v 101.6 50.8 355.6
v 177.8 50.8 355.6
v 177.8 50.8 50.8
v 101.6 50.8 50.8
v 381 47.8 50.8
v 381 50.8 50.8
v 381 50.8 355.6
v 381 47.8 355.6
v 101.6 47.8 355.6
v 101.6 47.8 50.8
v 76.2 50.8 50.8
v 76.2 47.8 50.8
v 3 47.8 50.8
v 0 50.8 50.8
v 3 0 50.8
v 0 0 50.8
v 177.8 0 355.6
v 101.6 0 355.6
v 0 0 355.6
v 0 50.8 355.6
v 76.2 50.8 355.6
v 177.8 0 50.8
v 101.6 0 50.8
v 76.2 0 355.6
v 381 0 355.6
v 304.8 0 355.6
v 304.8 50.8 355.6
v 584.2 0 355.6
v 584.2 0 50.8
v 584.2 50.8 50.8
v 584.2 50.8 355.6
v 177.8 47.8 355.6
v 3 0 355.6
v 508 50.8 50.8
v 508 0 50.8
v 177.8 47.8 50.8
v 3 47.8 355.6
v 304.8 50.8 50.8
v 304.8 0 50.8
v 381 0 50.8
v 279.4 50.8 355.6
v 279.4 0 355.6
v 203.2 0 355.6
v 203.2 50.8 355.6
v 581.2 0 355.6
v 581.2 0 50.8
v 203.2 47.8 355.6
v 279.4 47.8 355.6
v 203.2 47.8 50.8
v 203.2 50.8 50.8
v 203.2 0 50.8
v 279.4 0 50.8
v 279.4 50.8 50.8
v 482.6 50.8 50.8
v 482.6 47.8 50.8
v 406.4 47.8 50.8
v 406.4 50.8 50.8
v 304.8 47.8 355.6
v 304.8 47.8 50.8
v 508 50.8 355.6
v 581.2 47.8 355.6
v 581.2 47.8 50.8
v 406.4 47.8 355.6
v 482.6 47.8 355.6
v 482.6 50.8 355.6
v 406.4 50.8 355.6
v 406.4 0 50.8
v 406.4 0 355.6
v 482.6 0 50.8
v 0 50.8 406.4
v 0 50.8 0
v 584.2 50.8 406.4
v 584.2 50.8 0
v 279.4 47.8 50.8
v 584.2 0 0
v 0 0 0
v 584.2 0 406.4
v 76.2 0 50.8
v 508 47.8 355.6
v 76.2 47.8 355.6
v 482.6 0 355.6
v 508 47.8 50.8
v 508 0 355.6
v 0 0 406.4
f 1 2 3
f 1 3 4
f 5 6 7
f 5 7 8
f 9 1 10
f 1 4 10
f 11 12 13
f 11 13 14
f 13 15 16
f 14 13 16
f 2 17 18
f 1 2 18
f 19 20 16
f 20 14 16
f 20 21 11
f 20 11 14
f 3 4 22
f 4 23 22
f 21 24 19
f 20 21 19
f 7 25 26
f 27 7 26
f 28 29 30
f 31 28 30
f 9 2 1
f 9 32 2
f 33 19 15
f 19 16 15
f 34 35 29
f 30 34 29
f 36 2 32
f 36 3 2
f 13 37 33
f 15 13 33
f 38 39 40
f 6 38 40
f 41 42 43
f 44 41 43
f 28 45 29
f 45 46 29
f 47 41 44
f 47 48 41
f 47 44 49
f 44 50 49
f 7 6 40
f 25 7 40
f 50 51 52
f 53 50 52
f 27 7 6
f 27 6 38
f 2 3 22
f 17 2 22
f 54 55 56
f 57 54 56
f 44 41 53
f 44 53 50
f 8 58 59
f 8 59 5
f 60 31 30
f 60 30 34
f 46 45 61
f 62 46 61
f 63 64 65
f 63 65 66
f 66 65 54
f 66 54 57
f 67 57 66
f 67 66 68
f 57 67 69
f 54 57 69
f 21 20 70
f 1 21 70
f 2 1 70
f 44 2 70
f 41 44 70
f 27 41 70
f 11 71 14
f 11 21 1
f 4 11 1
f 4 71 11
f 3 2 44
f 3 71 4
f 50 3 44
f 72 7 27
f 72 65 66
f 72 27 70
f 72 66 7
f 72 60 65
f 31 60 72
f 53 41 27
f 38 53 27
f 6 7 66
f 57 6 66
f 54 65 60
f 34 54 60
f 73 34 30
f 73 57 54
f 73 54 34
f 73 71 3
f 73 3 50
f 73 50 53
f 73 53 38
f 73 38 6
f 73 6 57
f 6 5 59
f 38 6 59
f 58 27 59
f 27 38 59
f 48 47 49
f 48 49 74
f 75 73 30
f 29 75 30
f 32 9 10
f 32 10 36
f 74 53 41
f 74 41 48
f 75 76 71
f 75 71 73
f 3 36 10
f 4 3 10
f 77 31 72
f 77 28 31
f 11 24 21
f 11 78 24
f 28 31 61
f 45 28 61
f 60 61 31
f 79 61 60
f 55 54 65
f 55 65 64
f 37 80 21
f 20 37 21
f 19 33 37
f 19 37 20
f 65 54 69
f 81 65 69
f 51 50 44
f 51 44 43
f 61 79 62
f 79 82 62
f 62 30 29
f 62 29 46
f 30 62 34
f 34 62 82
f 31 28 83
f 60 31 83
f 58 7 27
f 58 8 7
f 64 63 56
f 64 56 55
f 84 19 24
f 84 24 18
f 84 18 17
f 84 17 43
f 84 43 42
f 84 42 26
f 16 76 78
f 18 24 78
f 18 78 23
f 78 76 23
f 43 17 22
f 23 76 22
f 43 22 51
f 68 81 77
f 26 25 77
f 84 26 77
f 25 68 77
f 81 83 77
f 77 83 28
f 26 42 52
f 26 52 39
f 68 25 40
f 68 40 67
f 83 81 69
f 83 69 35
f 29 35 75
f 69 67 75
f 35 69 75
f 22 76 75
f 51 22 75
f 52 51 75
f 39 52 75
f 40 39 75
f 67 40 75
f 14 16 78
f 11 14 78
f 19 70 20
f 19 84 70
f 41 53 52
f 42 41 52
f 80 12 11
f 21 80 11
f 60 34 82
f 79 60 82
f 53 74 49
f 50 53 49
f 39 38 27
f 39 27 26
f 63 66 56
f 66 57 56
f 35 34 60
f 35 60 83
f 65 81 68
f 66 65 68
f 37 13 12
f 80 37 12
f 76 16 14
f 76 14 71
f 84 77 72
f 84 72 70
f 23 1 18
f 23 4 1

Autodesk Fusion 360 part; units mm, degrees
sketch "Sketch2" plane through (0, 0, 0) normal (0, 1, 0) x (1, 0, 0)
sketch "Sketch3" plane through (0, 0, 0) normal (0, 1, 0) x (1, 0, 0)
  line L0 (0, 0) -> (584.2, 0)
  line L1 (584.2, 0) -> (584.2, -50.8)
  line L2 (584.2, -50.8) -> (0, -50.8)
  line L3 (0, -50.8) -> (0, 0)
  dimension "d1" = 584.2
  dimension "d2" = 50.8
extrude "Extrude1" add sketch "Sketch3" along normal blind 50.8 makes body 1
sketch "Sketch4" plane through (0, 0, 50.8) normal (0, 0, 1) x (-1, 0, 0)
  line L0 (0, 0) -> (-584.2, 0)
  line L1 (-584.2, 0) -> (-584.2, -50.8)
  line L2 (-584.2, -50.8) -> (0, -50.8)
  line L3 (0, -50.8) -> (0, 0)
  line L4 (0, 0) -> (-76.2, 0)
  line L5 (-76.2, 0) -> (-76.2, -50.8)
  line L6 (-76.2, -50.8) -> (0, -50.8)
  line L7 (0, -50.8) -> (0, 0)
  line L8 (-76.2, -50.8) -> (-101.6, -50.8)
  line L9 (-101.6, -50.8) -> (-101.6, 0)
  line L10 (-101.6, 0) -> (-76.2, 0)
  line L11 (-76.2, 0) -> (-76.2, -50.8)
  line L12 (-101.6, -50.8) -> (-177.8, -50.8)
  line L13 (-177.8, -50.8) -> (-177.8, 0)
  line L14 (-177.8, 0) -> (-101.6, 0)
  line L15 (-101.6, 0) -> (-101.6, -50.8)
  line L16 (-177.8, -50.8) -> (-203.2, -50.8)
  line L17 (-203.2, -50.8) -> (-203.2, 0)
  line L18 (-203.2, 0) -> (-177.8, 0)
  line L19 (-177.8, 0) -> (-177.8, -50.8)
  line L20 (-203.2, -50.8) -> (-279.4, -50.8)
  line L21 (-279.4, -50.8) -> (-279.4, 0)
  line L22 (-279.4, 0) -> (-203.2, 0)
  line L23 (-203.2, 0) -> (-203.2, -50.8)
  line L24 (-279.4, -50.8) -> (-304.8, -50.8)
  line L25 (-304.8, -50.8) -> (-304.8, 0)
  line L26 (-304.8, 0) -> (-279.4, 0)
  line L27 (-279.4, 0) -> (-279.4, -50.8)
  line L28 (-304.8, -50.8) -> (-381, -50.8)
  line L29 (-381, -50.8) -> (-381, 0)
  line L30 (-381, 0) -> (-304.8, 0)
  line L31 (-304.8, 0) -> (-304.8, -50.8)
  line L32 (-381, -50.8) -> (-406.4, -50.8)
  line L33 (-406.4, -50.8) -> (-406.4, 0)
  line L34 (-406.4, 0) -> (-381, 0)
  line L35 (-381, 0) -> (-381, -50.8)
  line L36 (-406.4, -50.8) -> (-482.6, -50.8)
  line L37 (-482.6, -50.8) -> (-482.6, 0)
  line L38 (-482.6, 0) -> (-406.4, 0)
  line L39 (-406.4, 0) -> (-406.4, -50.8)
  line L40 (-482.6, -50.8) -> (-508, -50.8)
  line L41 (-508, -50.8) -> (-508, 0)
  line L42 (-508, 0) -> (-482.6, 0)
  line L43 (-482.6, 0) -> (-482.6, -50.8)
  line L44 (-508, -50.8) -> (-584.2, -50.8)
  line L45 (-584.2, -50.8) -> (-584.2, 0)
  line L46 (-584.2, 0) -> (-508, 0)
  line L47 (-508, 0) -> (-508, -50.8)
  line L48 (0, -50.8) -> (-3, -50.8)
  line L49 (-3, -50.8) -> (-3, 0)
  line L50 (-3, 0) -> (0, 0)
  line L51 (0, 0) -> (0, -50.8)
  line L52 (0, 0) -> (-76.2, 0)
  line L53 (-76.2, 0) -> (-76.2, -3)
  line L54 (0, -3) -> (0, 0)
  line L55 (-101.6, 0) -> (-177.8, 0)
  line L56 (-177.8, 0) -> (-177.8, -3)
  line L57 (-101.6, -3) -> (-101.6, 0)
  line L58 (-203.2, 0) -> (-279.4, 0)
  line L59 (-279.4, 0) -> (-279.4, -3)
  line L60 (-203.2, -3) -> (-203.2, 0)
  line L61 (-304.8, 0) -> (-381, 0)
  line L62 (-381, 0) -> (-381, -3)
  line L63 (-304.8, -3) -> (-304.8, 0)
  line L64 (-406.4, 0) -> (-482.6, 0)
  line L65 (-482.6, 0) -> (-482.6, -3)
  line L66 (-406.4, -3) -> (-406.4, 0)
  line L67 (-508, 0) -> (-584.2, 0)
  line L68 (-584.2, 0) -> (-584.2, -3)
  line L69 (-508, -3) -> (-508, 0)
  line L70 (-584.2, 0) -> (-581.2, 0)
  line L71 (-581.2, 0) -> (-581.2, -50.8)
  line L72 (-581.2, -50.8) -> (-584.2, -50.8)
  line L73 (-584.2, -50.8) -> (-584.2, 0)
  line L74 (-584.2, -50.8) -> (-508, -50.8)
  line L75 (-508, -50.8) -> (-508, -47.8)
  line L76 (-508, -47.8) -> (-584.2, -47.8)
  line L77 (-584.2, -47.8) -> (-584.2, -50.8)
  line L78 (-482.6, -50.8) -> (-406.4, -50.8)
  line L79 (-406.4, -50.8) -> (-406.4, -47.8)
  line L80 (-406.4, -47.8) -> (-482.6, -47.8)
  line L81 (-482.6, -47.8) -> (-482.6, -50.8)
  line L82 (-381, -50.8) -> (-304.8, -50.8)
  line L83 (-304.8, -50.8) -> (-304.8, -47.8)
  line L84 (-304.8, -47.8) -> (-381, -47.8)
  line L85 (-381, -47.8) -> (-381, -50.8)
  line L86 (-279.4, -50.8) -> (-203.2, -50.8)
  line L87 (-203.2, -50.8) -> (-203.2, -47.8)
  line L88 (-203.2, -47.8) -> (-279.4, -47.8)
  line L89 (-279.4, -47.8) -> (-279.4, -50.8)
  line L90 (-177.8, -50.8) -> (-101.6, -50.8)
  line L91 (-101.6, -50.8) -> (-101.6, -47.8)
  line L92 (-101.6, -47.8) -> (-177.8, -47.8)
  line L93 (-177.8, -47.8) -> (-177.8, -50.8)
  line L94 (-76.2, -50.8) -> (0, -50.8)
  line L95 (0, -50.8) -> (0, -47.8)
  line L96 (0, -47.8) -> (-76.2, -47.8)
  line L97 (-76.2, -47.8) -> (-76.2, -50.8)
  dimension "d5" = 76.2
  dimension "d6" = 25.4
  dimension "d7" = 76.2
  dimension "d8" = 25.4
  dimension "d9" = 76.2
  dimension "d10" = 25.4
  dimension "d11" = 76.2
  dimension "d12" = 25.4
  dimension "d13" = 76.2
  dimension "d14" = 25.4
  dimension "d15" = 76.2
  dimension "d24" = 3
  dimension "d25" = 3
  dimension "d26" = 3
  dimension "d27" = 3
  dimension "d28" = 3
  dimension "d29" = 3
  dimension "d30" = 3
  dimension "d31" = 3
  dimension "d32" = 3
  dimension "d33" = 3
  dimension "d34" = 3
  dimension "d35" = 3
  dimension "d36" = 3
  dimension "d37" = 3
sketch "Sketch5" plane through (0, 0, 0) normal (0, 1, 0) x (1, 0, 0)
extrude "Extrude2" add sketch "Sketch4" along normal blind 355.6 bodies 1
sketch "Sketch6" plane through (0, 0, 0) normal (0, -1, 0) x (1, 0, 0)
  line L0 (0, 406.4) -> (0, 0)
  line L1 (0, 0) -> (584.2, 0)
  line L2 (584.2, 0) -> (584.2, 406.4)
  line L3 (584.2, 406.4) -> (0, 406.4)
  line L4 (0, 0) -> (0, 50.8) construction
  line L5 (0, 50.8) -> (584.2, 50.8)
  line L6 (584.2, 50.8) -> (584.2, 355.6)
  line L7 (584.2, 355.6) -> (0, 355.6)
  line L8 (0, 355.6) -> (0, 50.8)
  dimension "d18" = 50.8
  dimension "d19" = 304.8
extrude "Extrude3" cut sketch "Sketch6" against normal blind 325 contours L0 L2 L5 L6 L7 L8 bodies 1 makes body 2 at (194.7333, 33.8667, 406.4)
extrude "Extrude4" add sketch "Sketch4" along normal blind 304.8 contours L0 L2 L5 L8 L9 L10 L11 L15 L53 L57 L91 L97 | L0 L2 L13 L16 L17 L18 L19 L23 L56 L60 L87 L93 | L0 L2 L21 L24 L25 L26 L27 L31 L59 L63 L83 L89 | L0 L2 L29 L32 L33 L34 L35 L39 L62 L66 L79 L85 | L0 L2 L37 L40 L41 L42 L43 L47 L65 L69 L75 L81 bodies 1 2
extrude "Extrude5" add sketch "Sketch4" along normal blind 304.8 separate body contours L0 L3 L4 L7 L49 L50 L51 L52 L54 L96 | L2 L3 L6 L7 L48 L49 L51 L94 L95 L96 | L2 L5 L6 L11 L49 L94 L96 L97 | L2 L9 L12 L13 L15 L19 L90 L91 L92 L93 | L2 L17 L20 L21 L23 L27 L86 L87 L88 L89 | L2 L25 L28 L29 L31 L35 L82 L83 L84 L85 | L2 L33 L36 L37 L39 L43 L78 L79 L80 L81 | L0 L1 L45 L46 L67 L68 L70 L71 L73 L76 | L2 L41 L44 L47 L71 L74 L75 L76 | L1 L2 L44 L45 L71 L72 L73 L74 L76 L77 makes body 3 at (254, 50.8, 254) makes body 4 at (558.8, 50.8, 254) makes body 5 at (127, 47.8, 254) makes body 6 at (355.6, 50.8, 254) makes body 7 at (431.8, 47.8, 254) makes body 8 at (50.8, 50.8, 254)
sketch "Sketch7" plane through (0, 0, 0) normal (0, -1, 0) x (1, 0, 0)
  line L0 (482.6, 50.8) -> (406.4, 50.8)
  line L1 (406.4, 50.8) -> (406.4, 355.6)
  line L2 (406.4, 355.6) -> (482.6, 355.6)
  line L3 (482.6, 355.6) -> (482.6, 50.8)
  line L4 (508, 50.8) -> (508, 355.6)
  line L5 (508, 355.6) -> (584.2, 355.6)
  line L6 (584.2, 355.6) -> (584.2, 406.4)
  line L7 (584.2, 406.4) -> (0, 406.4)
  line L8 (0, 406.4) -> (0, 355.6)
  line L9 (0, 355.6) -> (76.2, 355.6)
  line L10 (76.2, 355.6) -> (76.2, 50.8)
  line L11 (76.2, 50.8) -> (0, 50.8)
  line L12 (0, 50.8) -> (0, 0)
  line L13 (0, 0) -> (584.2, 0)
  line L14 (584.2, 0) -> (584.2, 50.8)
  line L15 (584.2, 50.8) -> (508, 50.8)
  line L16 (381, 50.8) -> (304.8, 50.8)
  line L17 (304.8, 50.8) -> (304.8, 355.6)
  line L18 (304.8, 355.6) -> (381, 355.6)
  line L19 (381, 355.6) -> (381, 50.8)
  line L20 (101.6, 50.8) -> (101.6, 355.6)
  line L21 (101.6, 355.6) -> (177.8, 355.6)
  line L22 (177.8, 355.6) -> (177.8, 50.8)
  line L23 (177.8, 50.8) -> (101.6, 50.8)
  line L24 (203.2, 50.8) -> (203.2, 355.6)
  line L25 (203.2, 355.6) -> (279.4, 355.6)
  line L26 (279.4, 355.6) -> (279.4, 50.8)
  line L27 (279.4, 50.8) -> (203.2, 50.8)
  line L28 (0, 406.4) -> (584.2, 406.4)
  line L29 (584.2, 406.4) -> (584.2, 0)
  line L30 (584.2, 0) -> (0, 0)
  line L31 (0, 0) -> (0, 406.4)
sketch "Sketch8" plane through (292.1, 0, 203.2) normal (0, -1, 0) x (1, 0, 0)
sketch "Sketch9" plane through (0, 0, 0) normal (0, -1, 0) x (1, 0, 0)
  line L0 (0, 0) -> (584.2, 0)
  line L1 (584.2, 0) -> (584.2, 406.4)
  line L2 (584.2, 406.4) -> (0, 406.4)
  line L3 (0, 406.4) -> (0, 0)
  dimension "d40" = 584.2
  dimension "d41" = 406.4
